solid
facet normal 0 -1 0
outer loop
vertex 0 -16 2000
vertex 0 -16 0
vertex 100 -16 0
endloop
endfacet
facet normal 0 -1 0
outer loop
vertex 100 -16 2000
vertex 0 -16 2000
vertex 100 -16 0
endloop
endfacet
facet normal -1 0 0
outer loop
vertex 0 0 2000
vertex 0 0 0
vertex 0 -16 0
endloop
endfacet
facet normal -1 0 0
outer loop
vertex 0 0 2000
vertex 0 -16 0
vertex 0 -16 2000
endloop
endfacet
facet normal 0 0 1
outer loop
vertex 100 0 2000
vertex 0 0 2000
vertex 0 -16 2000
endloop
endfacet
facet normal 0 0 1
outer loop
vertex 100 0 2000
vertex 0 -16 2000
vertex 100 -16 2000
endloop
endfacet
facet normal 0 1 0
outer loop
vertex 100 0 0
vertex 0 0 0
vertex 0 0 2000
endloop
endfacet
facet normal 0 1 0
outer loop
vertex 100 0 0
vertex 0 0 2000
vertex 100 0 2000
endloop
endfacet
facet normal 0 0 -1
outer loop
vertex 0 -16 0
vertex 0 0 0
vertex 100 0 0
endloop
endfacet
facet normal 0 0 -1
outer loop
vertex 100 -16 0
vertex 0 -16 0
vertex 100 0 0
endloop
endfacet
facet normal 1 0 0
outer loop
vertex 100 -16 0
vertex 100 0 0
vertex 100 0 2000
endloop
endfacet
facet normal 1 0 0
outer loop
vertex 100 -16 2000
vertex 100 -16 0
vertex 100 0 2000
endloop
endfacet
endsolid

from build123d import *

# Parameters (mm, degrees)
F0_W     = 61.3434761763
F0_H     = 59.5392733812
F1_DEPTH = 16
F2_DEPTH = 16
F3_DEPTH = 2000
F4_DEPTH = 100


with BuildPart() as f1:
    # F0 (on Top) → F1 (new body)
    with BuildSketch(Plane.XY):
        with Locations((30.6717380881, -29.7696366906)):
            Rectangle(F0_W, F0_H)
    extrude(amount=F1_DEPTH)

    # F2 (intersect): a face of the model
    f2_faces = [f1.faces().sort_by_distance(p)[0] for p in [
        (30.6717380881, 0, 8),
    ]]
    extrude(f2_faces, amount=-F2_DEPTH, mode=Mode.INTERSECT)

    # F3 (add): a face of the model
    f3_faces = [f1.faces().sort_by_distance(p)[0] for p in [
        (30.6717380881, -8, 0),
    ]]
    extrude(f3_faces, amount=-F3_DEPTH)

    # F4 (add): a face of the model
    f4_faces = [f1.faces().sort_by_distance(p)[0] for p in [
        (0, -8, 1000),
    ]]
    extrude(f4_faces, amount=-F4_DEPTH)


solid = f1.part
